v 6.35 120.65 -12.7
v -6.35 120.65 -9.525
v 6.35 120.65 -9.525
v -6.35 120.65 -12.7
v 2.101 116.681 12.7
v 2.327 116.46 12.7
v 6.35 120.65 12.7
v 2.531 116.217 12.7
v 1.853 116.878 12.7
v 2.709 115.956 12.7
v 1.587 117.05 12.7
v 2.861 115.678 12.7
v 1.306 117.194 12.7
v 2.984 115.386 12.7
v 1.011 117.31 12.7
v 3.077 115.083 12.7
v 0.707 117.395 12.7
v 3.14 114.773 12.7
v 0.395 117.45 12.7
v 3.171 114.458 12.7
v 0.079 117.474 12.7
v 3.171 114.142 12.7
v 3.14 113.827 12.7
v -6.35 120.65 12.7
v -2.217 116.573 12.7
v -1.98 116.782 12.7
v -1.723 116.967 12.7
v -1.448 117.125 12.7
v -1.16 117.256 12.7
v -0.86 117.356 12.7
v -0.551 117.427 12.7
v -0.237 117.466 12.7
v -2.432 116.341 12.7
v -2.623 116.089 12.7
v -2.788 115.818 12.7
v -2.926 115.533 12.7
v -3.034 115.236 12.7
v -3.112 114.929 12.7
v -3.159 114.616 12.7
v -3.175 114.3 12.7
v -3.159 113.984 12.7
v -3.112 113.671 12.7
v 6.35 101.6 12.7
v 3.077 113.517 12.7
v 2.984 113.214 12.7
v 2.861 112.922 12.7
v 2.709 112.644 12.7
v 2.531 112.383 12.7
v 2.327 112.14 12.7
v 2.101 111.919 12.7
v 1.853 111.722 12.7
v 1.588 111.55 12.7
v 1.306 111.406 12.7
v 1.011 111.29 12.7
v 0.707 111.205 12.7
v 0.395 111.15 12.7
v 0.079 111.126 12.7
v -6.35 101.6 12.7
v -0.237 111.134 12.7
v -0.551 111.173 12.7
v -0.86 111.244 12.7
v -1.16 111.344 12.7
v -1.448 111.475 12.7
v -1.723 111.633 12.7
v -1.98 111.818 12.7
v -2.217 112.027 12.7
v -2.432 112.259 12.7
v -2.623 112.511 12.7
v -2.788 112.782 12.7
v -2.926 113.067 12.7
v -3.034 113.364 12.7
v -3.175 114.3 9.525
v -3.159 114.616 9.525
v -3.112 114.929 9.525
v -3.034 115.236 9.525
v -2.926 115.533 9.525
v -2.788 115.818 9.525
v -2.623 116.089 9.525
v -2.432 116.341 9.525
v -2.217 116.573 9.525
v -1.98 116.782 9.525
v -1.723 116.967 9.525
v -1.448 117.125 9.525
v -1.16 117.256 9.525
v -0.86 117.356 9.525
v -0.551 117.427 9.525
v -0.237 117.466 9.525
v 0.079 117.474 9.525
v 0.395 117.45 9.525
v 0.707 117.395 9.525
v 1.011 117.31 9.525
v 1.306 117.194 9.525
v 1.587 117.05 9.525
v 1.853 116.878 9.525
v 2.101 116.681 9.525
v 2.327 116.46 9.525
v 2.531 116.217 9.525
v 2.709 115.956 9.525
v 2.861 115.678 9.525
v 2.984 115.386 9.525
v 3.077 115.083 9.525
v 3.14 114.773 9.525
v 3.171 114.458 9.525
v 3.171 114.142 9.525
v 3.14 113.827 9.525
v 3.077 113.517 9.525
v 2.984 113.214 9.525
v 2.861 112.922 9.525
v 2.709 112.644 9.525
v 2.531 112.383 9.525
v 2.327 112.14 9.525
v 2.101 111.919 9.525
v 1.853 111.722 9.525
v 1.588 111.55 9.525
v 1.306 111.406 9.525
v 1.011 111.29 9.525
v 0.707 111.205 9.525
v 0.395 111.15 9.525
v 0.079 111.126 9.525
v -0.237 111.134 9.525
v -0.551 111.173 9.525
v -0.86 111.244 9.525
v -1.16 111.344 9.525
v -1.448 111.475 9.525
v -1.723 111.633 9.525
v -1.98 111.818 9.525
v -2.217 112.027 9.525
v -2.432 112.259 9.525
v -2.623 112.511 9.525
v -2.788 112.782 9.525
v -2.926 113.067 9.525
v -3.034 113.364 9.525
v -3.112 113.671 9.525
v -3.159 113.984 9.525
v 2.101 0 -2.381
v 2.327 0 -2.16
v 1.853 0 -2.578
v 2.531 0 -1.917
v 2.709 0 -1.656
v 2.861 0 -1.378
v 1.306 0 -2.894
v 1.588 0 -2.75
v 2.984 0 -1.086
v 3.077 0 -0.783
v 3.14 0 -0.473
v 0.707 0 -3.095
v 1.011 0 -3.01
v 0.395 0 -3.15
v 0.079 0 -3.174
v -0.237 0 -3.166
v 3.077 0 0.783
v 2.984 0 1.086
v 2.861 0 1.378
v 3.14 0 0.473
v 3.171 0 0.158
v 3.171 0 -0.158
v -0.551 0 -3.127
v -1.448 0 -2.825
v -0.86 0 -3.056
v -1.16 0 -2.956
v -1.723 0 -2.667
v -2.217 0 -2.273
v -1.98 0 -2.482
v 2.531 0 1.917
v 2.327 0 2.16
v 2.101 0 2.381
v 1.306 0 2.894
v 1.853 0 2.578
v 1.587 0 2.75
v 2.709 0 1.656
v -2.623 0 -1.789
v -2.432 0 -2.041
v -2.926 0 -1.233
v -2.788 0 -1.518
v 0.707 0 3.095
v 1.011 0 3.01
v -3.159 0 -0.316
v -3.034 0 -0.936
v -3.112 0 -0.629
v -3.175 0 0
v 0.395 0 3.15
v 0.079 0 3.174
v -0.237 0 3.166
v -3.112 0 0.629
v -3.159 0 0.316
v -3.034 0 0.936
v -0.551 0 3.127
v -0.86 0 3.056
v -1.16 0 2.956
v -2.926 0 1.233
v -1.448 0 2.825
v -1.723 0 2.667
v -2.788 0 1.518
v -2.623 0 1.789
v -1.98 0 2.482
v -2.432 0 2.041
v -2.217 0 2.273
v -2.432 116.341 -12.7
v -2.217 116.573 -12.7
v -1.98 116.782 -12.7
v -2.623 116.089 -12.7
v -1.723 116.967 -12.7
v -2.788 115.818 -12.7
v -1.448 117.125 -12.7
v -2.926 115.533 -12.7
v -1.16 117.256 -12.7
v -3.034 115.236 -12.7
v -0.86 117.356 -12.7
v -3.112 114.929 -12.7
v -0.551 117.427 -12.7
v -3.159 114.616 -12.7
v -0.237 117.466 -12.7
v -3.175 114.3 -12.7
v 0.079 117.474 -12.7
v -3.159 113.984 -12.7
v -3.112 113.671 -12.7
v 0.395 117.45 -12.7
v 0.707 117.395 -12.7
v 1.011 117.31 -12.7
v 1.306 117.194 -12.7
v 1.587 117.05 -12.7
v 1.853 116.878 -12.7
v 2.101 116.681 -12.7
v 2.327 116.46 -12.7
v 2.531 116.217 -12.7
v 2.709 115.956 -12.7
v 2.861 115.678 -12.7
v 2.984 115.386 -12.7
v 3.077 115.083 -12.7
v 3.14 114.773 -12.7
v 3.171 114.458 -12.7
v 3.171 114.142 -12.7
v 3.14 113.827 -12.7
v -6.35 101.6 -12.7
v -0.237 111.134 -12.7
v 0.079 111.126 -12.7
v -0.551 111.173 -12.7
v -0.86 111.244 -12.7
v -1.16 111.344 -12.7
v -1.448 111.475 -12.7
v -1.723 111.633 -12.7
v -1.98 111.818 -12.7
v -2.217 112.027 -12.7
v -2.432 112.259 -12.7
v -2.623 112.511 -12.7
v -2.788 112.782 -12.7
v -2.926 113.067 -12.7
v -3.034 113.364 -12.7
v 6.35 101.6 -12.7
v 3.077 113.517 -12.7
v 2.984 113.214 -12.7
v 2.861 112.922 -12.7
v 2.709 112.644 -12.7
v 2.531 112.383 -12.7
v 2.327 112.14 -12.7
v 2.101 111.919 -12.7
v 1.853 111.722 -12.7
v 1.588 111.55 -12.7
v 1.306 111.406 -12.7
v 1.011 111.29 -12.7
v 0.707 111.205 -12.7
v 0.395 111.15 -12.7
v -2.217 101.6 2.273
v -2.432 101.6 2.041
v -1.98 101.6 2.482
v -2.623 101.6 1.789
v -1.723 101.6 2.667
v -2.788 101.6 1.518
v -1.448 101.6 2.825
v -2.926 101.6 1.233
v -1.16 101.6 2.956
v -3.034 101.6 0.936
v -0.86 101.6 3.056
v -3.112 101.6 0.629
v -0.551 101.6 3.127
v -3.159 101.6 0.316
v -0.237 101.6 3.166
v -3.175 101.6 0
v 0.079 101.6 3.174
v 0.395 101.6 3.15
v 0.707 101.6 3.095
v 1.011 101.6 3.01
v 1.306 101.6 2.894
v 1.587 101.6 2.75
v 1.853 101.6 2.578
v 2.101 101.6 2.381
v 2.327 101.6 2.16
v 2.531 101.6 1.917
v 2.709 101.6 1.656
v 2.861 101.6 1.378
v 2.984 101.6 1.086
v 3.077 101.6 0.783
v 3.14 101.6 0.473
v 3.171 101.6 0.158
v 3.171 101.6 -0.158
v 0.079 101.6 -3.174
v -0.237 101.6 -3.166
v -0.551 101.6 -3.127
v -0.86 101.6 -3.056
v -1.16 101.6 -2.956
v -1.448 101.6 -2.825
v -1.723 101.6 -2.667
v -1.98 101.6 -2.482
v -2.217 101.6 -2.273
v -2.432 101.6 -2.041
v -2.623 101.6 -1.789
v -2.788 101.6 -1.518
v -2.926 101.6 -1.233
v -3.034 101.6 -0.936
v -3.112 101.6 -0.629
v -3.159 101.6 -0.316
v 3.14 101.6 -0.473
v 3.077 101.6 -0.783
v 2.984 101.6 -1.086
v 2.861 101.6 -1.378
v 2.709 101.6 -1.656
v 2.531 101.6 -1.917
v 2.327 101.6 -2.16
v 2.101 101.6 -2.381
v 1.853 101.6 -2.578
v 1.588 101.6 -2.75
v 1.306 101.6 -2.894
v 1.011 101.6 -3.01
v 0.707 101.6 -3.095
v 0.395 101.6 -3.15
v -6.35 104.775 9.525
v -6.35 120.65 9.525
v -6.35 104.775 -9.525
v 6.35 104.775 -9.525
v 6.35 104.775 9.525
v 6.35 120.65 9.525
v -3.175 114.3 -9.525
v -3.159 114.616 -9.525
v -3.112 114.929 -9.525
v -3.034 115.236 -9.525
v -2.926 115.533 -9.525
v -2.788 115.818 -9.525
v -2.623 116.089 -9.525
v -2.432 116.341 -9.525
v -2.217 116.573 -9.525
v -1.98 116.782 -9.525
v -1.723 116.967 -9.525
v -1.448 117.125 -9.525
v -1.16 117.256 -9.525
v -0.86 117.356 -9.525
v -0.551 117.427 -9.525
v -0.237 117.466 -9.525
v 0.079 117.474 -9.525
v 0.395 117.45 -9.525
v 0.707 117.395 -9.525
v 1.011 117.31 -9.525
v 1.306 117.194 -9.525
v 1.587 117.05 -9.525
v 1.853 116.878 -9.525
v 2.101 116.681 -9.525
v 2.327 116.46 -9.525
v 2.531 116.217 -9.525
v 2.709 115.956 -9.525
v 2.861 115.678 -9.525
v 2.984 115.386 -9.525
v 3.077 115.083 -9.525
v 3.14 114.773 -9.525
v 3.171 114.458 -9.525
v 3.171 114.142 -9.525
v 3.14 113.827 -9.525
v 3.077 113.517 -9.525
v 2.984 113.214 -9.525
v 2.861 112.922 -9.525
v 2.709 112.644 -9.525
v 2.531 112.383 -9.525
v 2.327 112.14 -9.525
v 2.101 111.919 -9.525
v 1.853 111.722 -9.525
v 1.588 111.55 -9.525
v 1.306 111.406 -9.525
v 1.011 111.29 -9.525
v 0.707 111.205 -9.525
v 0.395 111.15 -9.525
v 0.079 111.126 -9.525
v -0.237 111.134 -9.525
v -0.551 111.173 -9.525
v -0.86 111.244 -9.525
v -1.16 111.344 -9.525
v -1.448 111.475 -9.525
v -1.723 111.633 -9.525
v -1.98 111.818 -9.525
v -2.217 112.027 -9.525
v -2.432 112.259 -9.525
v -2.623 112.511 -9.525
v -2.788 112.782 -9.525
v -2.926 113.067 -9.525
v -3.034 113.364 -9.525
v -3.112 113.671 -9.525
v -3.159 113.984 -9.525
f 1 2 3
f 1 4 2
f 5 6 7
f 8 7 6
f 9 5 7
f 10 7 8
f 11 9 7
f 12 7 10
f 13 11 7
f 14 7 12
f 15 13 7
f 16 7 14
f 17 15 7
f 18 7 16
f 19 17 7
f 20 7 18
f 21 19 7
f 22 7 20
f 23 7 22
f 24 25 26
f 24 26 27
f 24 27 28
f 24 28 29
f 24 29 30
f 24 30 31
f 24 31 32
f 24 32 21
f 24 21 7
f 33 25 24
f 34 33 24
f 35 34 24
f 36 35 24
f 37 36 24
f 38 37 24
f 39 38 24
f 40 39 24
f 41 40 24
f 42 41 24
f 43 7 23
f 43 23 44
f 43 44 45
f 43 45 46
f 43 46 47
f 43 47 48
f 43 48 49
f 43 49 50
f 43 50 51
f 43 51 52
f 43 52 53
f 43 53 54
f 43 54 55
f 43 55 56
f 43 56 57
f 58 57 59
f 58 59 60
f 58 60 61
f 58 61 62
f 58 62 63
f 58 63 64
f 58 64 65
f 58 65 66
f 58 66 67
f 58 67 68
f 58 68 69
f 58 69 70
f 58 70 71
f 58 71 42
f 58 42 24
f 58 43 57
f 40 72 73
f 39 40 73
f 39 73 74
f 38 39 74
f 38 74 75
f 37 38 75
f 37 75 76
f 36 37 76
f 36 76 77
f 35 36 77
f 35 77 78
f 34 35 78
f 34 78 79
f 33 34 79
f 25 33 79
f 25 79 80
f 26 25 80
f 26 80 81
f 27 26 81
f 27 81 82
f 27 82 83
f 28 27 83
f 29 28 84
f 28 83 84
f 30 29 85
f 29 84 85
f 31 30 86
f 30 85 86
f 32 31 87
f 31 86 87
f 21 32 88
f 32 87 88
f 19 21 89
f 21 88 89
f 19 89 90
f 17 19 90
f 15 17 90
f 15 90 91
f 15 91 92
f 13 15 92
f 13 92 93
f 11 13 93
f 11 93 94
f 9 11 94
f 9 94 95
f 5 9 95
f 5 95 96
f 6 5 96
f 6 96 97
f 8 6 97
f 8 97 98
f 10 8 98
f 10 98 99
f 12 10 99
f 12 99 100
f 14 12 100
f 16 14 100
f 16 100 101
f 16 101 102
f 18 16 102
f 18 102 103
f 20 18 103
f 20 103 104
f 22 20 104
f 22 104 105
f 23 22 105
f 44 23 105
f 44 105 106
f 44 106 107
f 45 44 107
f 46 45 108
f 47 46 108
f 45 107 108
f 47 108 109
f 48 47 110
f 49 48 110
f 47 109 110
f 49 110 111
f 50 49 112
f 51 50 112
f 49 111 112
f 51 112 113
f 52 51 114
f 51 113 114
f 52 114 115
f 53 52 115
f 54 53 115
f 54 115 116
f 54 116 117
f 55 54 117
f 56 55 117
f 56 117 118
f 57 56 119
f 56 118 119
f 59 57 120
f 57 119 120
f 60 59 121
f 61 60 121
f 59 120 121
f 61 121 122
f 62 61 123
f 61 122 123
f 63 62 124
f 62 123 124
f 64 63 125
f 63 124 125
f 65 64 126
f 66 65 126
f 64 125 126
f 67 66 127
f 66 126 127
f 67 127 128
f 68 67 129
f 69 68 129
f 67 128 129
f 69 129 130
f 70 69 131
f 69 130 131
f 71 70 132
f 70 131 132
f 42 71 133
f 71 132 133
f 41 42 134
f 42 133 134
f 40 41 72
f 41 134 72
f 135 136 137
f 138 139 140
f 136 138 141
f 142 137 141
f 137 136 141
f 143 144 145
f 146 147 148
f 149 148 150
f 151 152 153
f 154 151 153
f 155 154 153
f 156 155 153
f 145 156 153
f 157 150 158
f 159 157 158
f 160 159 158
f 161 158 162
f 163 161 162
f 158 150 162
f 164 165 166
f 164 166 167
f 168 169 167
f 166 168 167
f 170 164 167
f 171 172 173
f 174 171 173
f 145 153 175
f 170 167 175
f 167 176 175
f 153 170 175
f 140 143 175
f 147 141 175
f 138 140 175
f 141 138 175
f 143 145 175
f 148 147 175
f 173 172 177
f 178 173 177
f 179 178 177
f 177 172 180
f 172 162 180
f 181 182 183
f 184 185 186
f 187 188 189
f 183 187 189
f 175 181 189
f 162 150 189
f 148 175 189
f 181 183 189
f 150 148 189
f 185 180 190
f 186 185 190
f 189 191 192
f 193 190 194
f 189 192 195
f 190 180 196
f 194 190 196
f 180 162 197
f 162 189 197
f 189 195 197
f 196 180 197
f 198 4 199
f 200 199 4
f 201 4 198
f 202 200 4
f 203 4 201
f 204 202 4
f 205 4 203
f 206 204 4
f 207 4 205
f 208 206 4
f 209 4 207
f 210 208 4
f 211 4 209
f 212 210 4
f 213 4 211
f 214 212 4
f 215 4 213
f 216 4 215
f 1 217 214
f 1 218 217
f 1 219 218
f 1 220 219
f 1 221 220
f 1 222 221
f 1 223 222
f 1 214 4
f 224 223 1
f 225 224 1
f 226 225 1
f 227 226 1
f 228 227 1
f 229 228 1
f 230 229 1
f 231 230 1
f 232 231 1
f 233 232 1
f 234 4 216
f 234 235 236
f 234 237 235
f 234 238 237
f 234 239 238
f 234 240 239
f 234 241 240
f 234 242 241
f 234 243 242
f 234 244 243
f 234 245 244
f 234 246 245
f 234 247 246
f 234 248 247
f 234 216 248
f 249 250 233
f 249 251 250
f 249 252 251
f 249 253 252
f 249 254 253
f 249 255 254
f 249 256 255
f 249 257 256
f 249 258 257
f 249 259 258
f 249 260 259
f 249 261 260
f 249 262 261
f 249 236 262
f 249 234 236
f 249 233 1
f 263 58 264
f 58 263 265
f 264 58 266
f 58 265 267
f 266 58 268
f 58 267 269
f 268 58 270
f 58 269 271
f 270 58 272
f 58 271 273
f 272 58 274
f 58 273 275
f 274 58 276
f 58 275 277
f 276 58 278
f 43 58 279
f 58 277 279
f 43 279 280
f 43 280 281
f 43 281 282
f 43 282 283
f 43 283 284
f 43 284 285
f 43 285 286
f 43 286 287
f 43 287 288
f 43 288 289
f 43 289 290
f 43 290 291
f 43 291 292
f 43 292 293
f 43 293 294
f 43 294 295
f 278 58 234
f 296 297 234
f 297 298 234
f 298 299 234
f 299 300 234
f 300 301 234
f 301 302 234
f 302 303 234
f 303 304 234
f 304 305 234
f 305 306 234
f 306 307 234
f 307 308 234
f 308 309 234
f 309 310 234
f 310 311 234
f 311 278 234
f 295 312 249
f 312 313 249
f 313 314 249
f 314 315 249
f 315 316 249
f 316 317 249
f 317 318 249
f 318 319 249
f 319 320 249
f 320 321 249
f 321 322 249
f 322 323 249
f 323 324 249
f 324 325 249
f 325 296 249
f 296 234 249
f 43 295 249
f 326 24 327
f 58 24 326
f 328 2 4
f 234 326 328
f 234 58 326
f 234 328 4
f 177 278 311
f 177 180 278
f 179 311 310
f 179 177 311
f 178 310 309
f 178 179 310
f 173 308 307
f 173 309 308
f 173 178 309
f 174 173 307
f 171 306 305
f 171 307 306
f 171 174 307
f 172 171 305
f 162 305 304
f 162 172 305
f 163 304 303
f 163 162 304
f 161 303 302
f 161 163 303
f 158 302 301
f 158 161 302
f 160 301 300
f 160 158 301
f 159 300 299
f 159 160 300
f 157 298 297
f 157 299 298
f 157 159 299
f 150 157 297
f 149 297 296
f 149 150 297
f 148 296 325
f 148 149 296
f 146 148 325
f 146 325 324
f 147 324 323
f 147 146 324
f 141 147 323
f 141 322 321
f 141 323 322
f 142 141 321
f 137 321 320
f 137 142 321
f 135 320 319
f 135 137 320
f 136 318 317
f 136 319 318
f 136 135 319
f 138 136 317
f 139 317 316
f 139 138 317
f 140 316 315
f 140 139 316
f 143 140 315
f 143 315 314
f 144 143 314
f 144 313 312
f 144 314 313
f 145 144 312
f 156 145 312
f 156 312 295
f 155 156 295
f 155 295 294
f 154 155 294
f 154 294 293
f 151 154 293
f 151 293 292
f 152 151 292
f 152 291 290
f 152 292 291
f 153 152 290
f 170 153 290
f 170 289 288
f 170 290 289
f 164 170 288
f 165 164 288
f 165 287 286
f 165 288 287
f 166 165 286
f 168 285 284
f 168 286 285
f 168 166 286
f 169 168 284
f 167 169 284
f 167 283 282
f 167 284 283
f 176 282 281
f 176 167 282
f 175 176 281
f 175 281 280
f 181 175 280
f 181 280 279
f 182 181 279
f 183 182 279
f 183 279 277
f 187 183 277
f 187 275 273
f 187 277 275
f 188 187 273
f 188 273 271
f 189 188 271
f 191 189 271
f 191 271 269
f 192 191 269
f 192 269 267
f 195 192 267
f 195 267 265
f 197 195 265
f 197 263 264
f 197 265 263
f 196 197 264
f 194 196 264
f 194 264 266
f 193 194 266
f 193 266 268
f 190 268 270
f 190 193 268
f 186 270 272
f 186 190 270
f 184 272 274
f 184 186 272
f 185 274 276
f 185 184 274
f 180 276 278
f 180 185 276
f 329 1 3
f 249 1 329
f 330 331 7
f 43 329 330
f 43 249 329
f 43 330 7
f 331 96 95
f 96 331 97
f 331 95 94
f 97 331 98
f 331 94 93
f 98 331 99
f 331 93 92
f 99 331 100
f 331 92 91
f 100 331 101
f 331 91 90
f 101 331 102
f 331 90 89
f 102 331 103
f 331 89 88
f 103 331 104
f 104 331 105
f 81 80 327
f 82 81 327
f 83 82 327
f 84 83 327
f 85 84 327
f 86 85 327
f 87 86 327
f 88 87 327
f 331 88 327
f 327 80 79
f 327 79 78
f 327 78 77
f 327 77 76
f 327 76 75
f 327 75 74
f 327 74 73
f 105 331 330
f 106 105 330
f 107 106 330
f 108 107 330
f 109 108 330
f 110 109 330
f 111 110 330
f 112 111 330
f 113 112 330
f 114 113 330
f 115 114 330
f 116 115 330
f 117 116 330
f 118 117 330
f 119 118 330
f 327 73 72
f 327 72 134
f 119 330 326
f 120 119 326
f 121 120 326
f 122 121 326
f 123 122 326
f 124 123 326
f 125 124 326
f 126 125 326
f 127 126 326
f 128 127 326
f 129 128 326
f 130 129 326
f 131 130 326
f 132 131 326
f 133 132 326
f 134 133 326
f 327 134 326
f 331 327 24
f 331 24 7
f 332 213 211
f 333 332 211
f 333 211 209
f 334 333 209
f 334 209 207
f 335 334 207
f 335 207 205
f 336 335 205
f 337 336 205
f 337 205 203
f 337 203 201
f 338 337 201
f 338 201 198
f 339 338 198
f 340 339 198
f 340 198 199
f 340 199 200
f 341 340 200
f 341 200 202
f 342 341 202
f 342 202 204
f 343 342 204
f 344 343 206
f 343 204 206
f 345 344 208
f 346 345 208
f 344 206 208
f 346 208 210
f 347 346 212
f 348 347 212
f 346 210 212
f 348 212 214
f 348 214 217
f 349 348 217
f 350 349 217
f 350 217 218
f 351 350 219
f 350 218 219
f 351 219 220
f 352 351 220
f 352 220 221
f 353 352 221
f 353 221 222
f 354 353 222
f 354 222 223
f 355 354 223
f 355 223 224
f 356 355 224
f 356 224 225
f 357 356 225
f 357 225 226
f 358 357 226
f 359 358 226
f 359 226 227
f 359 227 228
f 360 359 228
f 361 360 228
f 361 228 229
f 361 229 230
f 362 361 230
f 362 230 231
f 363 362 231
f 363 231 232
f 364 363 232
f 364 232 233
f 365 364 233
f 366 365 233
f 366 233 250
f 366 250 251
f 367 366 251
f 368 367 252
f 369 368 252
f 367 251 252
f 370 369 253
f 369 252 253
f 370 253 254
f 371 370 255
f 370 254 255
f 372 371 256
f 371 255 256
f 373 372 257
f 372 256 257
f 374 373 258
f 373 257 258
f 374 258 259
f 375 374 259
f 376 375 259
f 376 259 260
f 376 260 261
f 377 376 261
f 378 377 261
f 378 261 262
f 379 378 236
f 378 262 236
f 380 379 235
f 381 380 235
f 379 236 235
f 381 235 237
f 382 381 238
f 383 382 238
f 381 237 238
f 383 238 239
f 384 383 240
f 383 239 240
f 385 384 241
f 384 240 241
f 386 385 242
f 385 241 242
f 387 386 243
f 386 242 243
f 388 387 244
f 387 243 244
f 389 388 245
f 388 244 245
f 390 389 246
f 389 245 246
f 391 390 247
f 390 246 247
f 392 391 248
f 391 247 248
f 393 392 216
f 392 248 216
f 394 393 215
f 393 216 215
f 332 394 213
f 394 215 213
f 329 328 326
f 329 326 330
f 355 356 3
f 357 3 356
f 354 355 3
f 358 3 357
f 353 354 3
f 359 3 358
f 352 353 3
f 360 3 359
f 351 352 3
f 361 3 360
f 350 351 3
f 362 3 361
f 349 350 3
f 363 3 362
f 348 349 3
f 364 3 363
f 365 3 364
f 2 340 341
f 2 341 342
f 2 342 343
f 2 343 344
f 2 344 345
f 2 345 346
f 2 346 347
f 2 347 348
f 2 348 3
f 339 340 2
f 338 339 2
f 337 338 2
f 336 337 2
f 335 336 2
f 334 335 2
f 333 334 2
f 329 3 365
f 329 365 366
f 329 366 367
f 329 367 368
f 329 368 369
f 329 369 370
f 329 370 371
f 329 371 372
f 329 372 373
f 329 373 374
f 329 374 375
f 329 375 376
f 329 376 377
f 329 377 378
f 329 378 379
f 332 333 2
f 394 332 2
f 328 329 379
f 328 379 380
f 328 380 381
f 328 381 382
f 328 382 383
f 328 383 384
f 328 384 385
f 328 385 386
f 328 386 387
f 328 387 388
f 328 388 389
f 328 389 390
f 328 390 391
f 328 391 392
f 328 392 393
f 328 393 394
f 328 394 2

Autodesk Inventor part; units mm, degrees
ref_plane "YZ Plane" through (0, 0, 0) normal (1, 0, 0) x (0, 1, 0)
ref_plane "XZ Plane" through (0, 0, 0) normal (0, 1, 0) x (-1, 0, 0)
ref_plane "XY Plane" through (0, 0, 0) normal (0, 0, 1) x (1, 0, 0)
sketch "Sketch1" plane through (0, 0, 0) normal (0, 1, 0) x (-1, 0, 0)
  circle A0 centre (0, 0) radius 3.175
  dimension "d0" = 6.35
extrude "Extrusion1" add sketch "Sketch1" along normal blind 101.6
sketch "Sketch2" plane through (0, 101.6, 0) normal (0, 1, 0) x (1, 0, 0)
  line L0 (6.35, -12.7) -> (-6.35, -12.7)
  line L1 (-6.35, -12.7) -> (-6.35, 12.7)
  line L2 (-6.35, 12.7) -> (6.35, 12.7)
  line L3 (6.35, 12.7) -> (6.35, -12.7)
  line L4 (6.35, -12.7) -> (-6.35, 12.7) construction
  line L5 (-6.35, -12.7) -> (6.35, 12.7) construction
  point P0 (0, 0)
  dimension "d3" = 12.7
  dimension "d4" = 25.4
extrude "Extrusion2" add sketch "Sketch2" along normal blind 3.175
sketch "Sketch3" plane through (0, 104.775, 0) normal (0, 1, 0) x (1, 0, 0)
  point P0 (0, 0)
sketch "Sketch4" plane through (0, 104.775, 0) normal (0, 1, 0) x (1, 0, 0)
  line L0 (6.35, -12.7) -> (6.35, 12.7) projected
  line L1 (-6.35, -12.7) -> (6.35, -12.7)
  line L2 (6.35, -12.7) -> (6.35, -9.525)
  line L3 (6.35, -9.525) -> (-6.35, -9.525)
  line L4 (-6.35, -9.525) -> (-6.35, -12.7)
  line L5 (-6.35, 12.7) -> (6.35, 12.7)
  line L6 (6.35, 12.7) -> (6.35, 9.525)
  line L7 (6.35, 9.525) -> (-6.35, 9.525)
  line L8 (-6.35, 9.525) -> (-6.35, 12.7)
  line L9 (6.35, 12.7) -> (-6.35, 12.7) projected
  point P0 (0, 0)
  dimension "d7" = 3.175
  dimension "d8" = 3.175
  dimension "d9" = 0
extrude "Extrusion3" add sketch "Sketch4" along normal blind 15.875
sketch "Sketch5" plane through (6.35, 101.6, -12.7) normal (0, 0, -1) x (-1, 0, 0)
  circle A0 centre (6.35, 12.7) radius 3.175
  line L0 (12.7, 0) -> (0, 0) projected
  point P0 (6.35, -101.6)
  dimension "d12" = 6.35
  dimension "d13" = 12.7
extrude "Extrusion4" cut sketch "Sketch5" against normal blind 50.8
properties part number "PC3.5-ROD"
